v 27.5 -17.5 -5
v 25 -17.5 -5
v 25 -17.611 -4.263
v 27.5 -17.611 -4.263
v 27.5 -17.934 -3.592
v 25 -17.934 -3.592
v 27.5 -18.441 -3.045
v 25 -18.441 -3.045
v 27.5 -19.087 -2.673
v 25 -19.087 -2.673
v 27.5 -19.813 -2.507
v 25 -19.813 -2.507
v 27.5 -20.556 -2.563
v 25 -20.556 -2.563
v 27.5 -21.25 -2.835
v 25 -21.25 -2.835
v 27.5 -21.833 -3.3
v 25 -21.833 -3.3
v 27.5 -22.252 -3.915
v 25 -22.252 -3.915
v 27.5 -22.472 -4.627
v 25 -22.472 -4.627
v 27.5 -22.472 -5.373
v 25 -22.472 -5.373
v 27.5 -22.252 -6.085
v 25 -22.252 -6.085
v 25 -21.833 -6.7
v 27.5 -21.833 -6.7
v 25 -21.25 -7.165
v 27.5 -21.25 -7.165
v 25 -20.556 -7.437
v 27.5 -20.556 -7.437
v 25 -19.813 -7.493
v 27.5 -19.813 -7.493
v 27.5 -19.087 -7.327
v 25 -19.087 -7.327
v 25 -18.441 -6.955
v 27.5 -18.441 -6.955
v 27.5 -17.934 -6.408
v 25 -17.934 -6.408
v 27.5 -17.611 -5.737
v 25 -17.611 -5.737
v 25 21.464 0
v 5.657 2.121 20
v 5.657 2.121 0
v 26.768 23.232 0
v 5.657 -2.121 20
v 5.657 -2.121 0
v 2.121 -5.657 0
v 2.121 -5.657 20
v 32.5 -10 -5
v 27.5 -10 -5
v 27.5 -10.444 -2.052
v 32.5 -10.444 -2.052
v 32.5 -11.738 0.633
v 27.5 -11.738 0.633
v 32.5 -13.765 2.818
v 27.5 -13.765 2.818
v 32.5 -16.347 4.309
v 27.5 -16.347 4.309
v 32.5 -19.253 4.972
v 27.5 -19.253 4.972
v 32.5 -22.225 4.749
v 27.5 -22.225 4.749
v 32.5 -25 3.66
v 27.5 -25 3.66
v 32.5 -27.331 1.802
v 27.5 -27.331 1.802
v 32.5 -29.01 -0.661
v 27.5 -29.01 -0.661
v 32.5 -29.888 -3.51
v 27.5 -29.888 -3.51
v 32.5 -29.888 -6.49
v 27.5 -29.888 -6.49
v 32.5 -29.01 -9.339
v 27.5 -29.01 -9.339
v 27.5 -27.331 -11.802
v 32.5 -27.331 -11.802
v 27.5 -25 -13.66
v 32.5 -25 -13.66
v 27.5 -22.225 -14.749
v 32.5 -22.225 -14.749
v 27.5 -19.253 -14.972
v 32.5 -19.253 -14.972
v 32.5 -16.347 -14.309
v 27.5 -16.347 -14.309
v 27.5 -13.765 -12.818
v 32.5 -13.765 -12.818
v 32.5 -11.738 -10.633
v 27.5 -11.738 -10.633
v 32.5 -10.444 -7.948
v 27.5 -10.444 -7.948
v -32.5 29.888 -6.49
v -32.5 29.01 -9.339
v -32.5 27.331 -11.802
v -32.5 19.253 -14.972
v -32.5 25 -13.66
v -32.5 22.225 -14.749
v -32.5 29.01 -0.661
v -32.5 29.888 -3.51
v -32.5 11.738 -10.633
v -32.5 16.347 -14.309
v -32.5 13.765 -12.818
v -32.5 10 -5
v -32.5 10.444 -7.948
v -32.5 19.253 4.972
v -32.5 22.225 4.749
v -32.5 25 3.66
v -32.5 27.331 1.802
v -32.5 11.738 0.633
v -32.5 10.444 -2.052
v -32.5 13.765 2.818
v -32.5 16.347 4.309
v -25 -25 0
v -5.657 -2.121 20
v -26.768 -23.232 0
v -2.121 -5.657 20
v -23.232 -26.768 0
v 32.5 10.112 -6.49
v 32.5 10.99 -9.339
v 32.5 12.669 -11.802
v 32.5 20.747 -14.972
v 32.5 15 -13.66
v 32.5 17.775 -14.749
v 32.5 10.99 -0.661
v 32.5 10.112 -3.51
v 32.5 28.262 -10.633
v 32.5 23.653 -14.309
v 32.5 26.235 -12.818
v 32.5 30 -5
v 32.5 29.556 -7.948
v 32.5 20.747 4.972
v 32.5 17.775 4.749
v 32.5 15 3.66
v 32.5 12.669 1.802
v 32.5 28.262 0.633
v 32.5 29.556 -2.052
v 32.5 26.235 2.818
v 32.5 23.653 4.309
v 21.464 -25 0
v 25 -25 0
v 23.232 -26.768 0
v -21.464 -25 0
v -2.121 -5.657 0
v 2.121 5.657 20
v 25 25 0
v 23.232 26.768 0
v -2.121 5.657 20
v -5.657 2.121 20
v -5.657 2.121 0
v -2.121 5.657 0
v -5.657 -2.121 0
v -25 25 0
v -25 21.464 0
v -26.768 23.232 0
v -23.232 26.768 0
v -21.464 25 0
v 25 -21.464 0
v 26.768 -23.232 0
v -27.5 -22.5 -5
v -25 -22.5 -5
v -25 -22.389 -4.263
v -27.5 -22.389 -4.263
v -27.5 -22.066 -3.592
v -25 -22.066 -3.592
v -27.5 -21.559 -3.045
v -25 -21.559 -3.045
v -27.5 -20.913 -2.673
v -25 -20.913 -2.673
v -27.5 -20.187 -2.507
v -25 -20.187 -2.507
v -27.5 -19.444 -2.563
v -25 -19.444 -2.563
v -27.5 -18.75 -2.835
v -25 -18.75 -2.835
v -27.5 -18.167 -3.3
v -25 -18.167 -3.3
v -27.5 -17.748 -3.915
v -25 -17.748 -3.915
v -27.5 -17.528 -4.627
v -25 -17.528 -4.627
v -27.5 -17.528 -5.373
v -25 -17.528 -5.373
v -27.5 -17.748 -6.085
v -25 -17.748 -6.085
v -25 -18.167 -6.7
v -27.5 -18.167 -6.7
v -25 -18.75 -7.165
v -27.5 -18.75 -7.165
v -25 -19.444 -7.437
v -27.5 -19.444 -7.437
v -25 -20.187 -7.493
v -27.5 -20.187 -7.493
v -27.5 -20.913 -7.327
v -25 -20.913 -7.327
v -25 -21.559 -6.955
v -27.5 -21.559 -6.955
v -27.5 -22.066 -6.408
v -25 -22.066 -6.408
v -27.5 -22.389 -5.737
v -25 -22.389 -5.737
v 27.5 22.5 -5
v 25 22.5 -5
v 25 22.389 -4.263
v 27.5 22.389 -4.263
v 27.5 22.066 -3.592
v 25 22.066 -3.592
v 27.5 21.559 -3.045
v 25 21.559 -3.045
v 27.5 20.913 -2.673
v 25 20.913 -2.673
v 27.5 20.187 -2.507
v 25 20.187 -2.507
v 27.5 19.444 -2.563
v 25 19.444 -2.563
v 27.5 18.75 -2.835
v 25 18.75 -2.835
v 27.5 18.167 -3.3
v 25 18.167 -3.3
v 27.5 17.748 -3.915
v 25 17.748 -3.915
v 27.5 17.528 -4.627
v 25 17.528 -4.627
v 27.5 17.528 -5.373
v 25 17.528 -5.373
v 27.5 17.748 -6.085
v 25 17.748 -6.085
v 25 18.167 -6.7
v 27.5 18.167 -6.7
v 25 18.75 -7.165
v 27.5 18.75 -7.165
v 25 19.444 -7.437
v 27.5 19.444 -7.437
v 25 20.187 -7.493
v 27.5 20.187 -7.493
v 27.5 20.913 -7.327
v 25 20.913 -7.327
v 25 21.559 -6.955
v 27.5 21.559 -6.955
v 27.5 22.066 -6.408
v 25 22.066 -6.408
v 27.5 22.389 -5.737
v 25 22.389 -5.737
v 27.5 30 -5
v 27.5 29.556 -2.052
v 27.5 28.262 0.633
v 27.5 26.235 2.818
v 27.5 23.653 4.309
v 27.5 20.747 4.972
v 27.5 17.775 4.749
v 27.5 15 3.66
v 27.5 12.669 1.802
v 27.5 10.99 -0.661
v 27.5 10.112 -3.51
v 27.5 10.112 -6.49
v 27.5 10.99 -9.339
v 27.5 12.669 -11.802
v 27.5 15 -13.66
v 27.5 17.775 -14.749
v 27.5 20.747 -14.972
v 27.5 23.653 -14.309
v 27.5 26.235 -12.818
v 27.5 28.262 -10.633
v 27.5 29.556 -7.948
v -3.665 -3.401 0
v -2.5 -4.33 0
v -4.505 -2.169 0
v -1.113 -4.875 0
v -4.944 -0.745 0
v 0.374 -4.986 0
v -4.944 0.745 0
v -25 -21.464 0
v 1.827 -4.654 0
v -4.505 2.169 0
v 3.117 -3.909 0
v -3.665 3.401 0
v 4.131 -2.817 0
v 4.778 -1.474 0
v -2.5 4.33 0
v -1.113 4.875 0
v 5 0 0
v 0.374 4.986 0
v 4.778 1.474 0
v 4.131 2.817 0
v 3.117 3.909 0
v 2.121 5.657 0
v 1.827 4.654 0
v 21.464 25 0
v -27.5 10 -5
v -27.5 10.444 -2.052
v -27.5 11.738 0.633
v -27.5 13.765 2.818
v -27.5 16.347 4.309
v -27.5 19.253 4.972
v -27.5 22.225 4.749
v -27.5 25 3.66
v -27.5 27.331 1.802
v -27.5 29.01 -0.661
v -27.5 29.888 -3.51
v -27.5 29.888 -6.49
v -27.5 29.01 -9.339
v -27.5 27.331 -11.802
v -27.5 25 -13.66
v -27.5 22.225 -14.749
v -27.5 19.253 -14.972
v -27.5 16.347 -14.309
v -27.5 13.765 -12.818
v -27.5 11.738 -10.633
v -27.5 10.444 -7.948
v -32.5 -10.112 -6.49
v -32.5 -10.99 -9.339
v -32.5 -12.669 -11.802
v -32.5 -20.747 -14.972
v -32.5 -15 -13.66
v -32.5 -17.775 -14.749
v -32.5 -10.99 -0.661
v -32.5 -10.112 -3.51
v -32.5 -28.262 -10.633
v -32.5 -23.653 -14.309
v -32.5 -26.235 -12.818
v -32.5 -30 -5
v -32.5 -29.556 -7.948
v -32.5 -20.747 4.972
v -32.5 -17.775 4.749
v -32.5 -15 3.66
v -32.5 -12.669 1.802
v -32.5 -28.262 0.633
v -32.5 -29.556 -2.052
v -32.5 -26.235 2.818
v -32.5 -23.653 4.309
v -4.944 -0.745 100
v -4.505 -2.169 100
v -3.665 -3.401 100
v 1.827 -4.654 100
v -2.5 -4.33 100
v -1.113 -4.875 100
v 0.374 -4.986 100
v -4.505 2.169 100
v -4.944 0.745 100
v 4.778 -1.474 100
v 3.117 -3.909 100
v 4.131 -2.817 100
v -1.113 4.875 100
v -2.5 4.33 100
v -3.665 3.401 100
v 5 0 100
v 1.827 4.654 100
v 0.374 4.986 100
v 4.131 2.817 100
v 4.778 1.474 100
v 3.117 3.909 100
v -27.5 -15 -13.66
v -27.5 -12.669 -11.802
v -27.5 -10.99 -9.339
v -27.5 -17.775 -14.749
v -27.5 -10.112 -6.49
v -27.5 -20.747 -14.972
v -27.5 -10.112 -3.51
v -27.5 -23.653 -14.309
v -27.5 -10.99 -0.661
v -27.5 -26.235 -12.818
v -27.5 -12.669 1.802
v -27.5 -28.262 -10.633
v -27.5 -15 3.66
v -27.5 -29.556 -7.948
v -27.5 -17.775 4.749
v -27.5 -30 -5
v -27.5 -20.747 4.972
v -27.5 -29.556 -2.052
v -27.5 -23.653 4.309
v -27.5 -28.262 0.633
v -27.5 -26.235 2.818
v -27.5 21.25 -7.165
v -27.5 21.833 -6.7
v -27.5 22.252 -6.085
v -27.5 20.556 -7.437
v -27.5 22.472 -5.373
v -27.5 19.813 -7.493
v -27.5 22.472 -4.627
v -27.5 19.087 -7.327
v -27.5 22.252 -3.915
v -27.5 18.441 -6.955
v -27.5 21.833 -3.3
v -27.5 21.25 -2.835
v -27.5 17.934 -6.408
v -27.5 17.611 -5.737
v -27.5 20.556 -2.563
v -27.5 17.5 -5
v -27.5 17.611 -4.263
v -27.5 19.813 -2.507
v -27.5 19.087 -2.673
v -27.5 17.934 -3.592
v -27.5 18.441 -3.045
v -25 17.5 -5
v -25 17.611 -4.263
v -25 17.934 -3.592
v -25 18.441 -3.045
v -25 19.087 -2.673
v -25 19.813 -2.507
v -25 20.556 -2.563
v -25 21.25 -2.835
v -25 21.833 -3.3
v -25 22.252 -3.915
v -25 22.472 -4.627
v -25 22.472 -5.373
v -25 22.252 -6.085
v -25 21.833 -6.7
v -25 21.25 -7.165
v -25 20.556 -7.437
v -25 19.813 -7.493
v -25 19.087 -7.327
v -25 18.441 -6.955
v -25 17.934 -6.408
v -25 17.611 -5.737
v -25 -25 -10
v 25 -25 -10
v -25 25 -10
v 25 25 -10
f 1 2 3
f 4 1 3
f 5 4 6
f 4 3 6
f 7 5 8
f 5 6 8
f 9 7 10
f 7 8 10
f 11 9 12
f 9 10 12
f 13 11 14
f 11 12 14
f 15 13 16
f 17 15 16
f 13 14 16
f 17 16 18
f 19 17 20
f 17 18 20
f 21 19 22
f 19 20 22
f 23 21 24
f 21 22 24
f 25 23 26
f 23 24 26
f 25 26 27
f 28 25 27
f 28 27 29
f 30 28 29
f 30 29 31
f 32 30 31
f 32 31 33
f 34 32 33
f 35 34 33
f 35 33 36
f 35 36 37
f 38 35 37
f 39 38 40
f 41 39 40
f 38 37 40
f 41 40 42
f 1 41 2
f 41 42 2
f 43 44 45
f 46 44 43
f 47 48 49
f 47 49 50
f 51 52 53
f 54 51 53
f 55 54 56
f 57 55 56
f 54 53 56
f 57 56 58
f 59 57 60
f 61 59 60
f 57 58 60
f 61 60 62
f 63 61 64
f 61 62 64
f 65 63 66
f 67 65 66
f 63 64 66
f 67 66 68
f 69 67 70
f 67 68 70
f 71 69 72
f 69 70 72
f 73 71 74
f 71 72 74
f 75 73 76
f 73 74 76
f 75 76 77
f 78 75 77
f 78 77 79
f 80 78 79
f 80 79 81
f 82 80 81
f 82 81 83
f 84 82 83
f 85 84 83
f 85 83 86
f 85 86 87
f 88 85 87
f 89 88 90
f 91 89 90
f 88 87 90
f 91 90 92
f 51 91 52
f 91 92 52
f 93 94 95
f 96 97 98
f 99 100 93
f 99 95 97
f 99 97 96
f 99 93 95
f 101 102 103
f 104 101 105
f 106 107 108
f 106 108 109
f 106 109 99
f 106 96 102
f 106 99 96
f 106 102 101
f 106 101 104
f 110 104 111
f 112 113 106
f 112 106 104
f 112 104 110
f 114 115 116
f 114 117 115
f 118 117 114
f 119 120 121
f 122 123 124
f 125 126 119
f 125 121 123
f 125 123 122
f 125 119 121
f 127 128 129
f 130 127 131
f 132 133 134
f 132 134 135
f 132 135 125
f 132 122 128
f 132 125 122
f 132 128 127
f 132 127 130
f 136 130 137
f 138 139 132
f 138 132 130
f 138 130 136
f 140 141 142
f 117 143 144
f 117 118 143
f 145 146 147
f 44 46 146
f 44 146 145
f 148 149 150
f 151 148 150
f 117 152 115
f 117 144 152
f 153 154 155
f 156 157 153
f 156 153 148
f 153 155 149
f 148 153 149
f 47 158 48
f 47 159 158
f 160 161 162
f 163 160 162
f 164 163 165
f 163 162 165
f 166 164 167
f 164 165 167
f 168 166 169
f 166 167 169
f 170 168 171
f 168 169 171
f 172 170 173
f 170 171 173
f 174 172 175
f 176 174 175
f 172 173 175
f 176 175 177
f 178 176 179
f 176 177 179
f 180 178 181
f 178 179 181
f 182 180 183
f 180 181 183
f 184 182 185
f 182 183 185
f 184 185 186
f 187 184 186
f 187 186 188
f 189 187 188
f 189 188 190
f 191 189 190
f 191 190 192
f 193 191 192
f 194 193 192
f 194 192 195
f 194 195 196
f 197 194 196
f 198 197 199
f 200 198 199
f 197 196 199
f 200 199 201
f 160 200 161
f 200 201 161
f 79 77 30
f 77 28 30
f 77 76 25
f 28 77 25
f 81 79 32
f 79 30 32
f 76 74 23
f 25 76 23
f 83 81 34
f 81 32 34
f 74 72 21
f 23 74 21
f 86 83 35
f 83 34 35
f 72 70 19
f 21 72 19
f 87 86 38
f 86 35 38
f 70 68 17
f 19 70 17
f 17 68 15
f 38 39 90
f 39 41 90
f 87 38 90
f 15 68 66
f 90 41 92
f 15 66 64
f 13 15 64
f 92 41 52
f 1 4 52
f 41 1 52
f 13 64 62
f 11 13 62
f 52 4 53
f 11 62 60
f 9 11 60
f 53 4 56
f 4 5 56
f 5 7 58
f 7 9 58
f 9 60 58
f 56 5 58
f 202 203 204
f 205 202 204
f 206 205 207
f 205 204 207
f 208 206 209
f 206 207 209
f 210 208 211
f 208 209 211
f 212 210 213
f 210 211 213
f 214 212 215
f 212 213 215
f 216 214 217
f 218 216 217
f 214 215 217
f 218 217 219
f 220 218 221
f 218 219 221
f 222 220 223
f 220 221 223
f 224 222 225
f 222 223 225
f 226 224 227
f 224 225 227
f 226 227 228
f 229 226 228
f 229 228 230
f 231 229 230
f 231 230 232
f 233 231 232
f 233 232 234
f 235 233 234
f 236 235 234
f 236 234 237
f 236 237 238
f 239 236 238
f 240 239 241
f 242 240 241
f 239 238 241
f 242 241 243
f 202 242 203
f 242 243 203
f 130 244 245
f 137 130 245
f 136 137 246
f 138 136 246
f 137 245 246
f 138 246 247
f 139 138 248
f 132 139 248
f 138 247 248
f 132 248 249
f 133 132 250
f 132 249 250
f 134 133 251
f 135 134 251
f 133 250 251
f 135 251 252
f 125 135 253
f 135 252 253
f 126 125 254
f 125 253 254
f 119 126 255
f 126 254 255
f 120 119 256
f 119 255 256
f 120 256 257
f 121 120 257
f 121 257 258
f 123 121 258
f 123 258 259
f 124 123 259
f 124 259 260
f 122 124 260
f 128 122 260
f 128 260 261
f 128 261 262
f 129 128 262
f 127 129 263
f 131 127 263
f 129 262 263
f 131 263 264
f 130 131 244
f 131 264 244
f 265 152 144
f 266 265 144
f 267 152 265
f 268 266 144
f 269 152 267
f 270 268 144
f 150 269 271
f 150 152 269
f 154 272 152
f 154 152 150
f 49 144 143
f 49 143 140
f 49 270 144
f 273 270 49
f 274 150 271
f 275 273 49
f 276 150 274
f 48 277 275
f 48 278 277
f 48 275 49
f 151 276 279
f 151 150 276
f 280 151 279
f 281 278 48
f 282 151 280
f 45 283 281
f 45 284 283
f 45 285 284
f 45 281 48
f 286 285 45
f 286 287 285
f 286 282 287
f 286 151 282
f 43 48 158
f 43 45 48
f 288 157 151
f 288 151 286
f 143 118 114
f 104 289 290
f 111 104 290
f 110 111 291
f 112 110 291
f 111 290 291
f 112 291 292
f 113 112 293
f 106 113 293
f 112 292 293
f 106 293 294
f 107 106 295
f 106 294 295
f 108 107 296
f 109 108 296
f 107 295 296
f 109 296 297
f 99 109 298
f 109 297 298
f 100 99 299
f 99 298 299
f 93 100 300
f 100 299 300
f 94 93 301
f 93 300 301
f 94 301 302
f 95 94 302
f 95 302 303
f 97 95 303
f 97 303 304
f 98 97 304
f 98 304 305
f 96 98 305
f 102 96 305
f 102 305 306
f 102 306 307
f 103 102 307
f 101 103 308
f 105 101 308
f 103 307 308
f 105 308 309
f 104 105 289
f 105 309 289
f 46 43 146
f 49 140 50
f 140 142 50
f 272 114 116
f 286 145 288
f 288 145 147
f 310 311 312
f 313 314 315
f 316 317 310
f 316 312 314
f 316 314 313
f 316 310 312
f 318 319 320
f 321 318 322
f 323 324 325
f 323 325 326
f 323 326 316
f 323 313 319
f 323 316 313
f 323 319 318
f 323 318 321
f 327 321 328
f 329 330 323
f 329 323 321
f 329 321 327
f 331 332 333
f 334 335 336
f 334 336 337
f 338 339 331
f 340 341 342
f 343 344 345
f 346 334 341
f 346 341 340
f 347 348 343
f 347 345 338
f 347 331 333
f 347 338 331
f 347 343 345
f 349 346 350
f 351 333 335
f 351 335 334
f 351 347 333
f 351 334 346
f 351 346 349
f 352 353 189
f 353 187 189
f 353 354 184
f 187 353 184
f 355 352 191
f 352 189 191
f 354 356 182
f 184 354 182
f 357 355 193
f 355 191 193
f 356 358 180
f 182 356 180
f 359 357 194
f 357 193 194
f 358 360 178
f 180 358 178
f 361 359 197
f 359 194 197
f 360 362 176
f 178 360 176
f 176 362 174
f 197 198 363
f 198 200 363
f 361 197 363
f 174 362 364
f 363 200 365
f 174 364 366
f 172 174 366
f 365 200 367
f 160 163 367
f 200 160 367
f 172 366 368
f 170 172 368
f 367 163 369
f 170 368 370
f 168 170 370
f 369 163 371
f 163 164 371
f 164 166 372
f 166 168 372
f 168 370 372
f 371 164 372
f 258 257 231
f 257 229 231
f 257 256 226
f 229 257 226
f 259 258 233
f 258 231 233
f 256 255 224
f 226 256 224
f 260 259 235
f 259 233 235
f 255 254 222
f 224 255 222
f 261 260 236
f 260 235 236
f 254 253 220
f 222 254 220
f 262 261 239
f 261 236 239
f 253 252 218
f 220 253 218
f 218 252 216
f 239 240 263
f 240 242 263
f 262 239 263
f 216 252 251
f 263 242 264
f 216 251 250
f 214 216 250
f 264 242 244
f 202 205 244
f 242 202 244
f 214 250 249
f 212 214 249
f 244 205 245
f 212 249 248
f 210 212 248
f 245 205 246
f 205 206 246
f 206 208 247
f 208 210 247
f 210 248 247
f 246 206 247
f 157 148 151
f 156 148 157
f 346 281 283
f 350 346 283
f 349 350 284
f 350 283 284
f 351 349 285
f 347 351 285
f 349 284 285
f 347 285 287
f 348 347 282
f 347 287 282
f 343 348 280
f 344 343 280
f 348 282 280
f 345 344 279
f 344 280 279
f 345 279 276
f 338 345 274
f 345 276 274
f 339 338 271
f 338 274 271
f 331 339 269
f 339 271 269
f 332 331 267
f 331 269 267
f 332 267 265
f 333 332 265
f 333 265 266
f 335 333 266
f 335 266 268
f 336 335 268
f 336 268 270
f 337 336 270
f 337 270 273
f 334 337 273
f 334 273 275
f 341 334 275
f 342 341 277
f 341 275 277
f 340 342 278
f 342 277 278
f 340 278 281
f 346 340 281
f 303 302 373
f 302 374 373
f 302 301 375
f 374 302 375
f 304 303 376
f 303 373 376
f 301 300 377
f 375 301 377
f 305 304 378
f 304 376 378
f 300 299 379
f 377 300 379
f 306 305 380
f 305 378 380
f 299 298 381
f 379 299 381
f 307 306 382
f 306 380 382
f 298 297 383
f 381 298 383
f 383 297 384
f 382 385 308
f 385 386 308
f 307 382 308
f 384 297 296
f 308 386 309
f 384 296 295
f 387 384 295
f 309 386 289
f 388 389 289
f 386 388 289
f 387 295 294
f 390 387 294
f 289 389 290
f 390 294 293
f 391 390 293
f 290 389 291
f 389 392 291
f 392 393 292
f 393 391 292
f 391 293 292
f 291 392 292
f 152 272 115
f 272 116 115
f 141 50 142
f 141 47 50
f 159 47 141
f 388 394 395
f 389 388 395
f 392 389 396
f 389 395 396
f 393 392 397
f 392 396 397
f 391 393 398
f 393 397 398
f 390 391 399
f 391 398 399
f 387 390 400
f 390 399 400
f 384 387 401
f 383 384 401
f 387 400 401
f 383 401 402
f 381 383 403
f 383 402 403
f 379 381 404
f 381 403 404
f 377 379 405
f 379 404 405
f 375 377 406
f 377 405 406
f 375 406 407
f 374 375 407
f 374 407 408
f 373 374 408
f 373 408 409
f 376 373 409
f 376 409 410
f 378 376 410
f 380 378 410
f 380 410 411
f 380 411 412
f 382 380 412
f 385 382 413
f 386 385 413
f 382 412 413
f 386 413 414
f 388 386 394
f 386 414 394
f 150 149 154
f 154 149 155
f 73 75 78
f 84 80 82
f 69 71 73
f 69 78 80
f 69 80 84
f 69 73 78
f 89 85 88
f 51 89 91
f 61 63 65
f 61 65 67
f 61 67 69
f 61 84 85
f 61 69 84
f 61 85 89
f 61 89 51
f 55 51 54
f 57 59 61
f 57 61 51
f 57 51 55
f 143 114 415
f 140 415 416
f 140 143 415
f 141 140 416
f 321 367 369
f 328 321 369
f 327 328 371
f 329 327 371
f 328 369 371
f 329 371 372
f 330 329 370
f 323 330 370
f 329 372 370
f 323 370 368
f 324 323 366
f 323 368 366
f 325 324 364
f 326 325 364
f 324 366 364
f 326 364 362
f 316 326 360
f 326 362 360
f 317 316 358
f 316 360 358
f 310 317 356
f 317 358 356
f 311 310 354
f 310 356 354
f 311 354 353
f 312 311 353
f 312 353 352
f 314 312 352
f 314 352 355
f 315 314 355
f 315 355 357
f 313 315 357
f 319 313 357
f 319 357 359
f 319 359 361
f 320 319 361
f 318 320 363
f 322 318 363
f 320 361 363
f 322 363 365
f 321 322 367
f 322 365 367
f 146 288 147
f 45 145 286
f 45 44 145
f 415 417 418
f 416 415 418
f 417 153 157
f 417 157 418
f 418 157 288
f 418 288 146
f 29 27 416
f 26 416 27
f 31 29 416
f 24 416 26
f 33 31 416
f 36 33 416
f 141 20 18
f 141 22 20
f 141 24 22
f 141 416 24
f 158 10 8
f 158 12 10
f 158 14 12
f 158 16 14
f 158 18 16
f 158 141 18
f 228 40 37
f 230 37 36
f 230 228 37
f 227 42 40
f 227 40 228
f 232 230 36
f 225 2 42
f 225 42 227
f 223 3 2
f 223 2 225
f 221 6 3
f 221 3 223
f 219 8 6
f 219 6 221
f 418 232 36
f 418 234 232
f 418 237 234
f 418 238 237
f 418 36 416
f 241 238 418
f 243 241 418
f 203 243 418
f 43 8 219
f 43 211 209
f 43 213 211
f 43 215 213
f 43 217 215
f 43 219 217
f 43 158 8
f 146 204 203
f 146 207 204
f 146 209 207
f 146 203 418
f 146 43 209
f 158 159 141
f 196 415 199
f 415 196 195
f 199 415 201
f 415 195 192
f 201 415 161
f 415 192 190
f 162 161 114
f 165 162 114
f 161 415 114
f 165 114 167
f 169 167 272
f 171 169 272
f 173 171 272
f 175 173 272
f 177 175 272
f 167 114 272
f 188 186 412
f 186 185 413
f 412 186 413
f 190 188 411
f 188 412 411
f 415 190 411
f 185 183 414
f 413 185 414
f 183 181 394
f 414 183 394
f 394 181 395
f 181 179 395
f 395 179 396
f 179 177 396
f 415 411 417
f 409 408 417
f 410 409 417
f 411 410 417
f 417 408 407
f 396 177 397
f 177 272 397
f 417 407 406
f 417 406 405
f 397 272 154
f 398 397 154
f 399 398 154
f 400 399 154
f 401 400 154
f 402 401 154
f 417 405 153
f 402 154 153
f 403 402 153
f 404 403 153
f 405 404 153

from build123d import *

# Parameters (mm, degrees)
F0_R      = 5
F1_DEPTH  = 100
F2_W      = 50
F2_H      = 50
F3_DEPTH  = 10
F4_R      = 2.5
F5_DEPTH  = 2.5
F6_R      = 10
F7_DEPTH  = 5
F8_R      = 10
F9_DEPTH  = 5
F10_R     = 2.5
F11_DEPTH = 2.5
F12_R     = 10
F13_DEPTH = 5
F14_R     = 10
F15_DEPTH = 5
F20_DEPTH = 2.5
F24_DEPTH = 2.5
F26_DEPTH = 2.5


with BuildPart() as f1:
    # F0 (on Top) → F1 (new body)
    with BuildSketch(Plane.XY):
        Circle(F0_R)
    extrude(amount=F1_DEPTH)

    # F2 (on Top) → F3 (join)
    with BuildSketch(Plane.XY):
        Rectangle(F2_W, F2_H)
    extrude(amount=-F3_DEPTH)

    # F4 (on face) → F5 (join)
    with BuildSketch(Plane.YZ.offset(25)):
        with Locations((-20, -5)):
            Circle(F4_R)
        with Locations((20, -5)):
            Circle(F4_R)
    extrude(amount=F5_DEPTH)

    # F6 (on face) → F7 (join)
    with BuildSketch(Plane.YZ.offset(27.5)):
        with Locations((-20, -5)):
            Circle(F6_R)
    extrude(amount=F7_DEPTH)

    # F8 (on face) → F9 (join)
    with BuildSketch(Plane.YZ.offset(27.5)):
        with Locations((20, -5)):
            Circle(F8_R)
    extrude(amount=F9_DEPTH)

    # F10 (on face) → F11 (join)
    with BuildSketch(Plane(origin=(-25, 0, 0), x_dir=(0, -1, 0), z_dir=(-1, 0, 0))):
        with Locations((-20, -5)):
            Circle(F10_R)
        with Locations((20, -5)):
            Circle(F10_R)
    extrude(amount=F11_DEPTH)

    # F12 (on face) → F13 (join)
    with BuildSketch(Plane(origin=(-27.5, 0, 0), x_dir=(0, -1, 0), z_dir=(-1, 0, 0))):
        with Locations((-20, -5)):
            Circle(F12_R)
    extrude(amount=F13_DEPTH)

    # F14 (on face) → F15 (join)
    with BuildSketch(Plane(origin=(-27.5, 0, 0), x_dir=(0, -1, 0), z_dir=(-1, 0, 0))):
        with Locations((20, -5)):
            Circle(F14_R)
    extrude(amount=F15_DEPTH)

    # F19 (on 3pt) → F20 (join, symmetric)
    with BuildSketch(Plane(origin=(0, 0, 0), x_dir=(0.7071067812, 0.7071067812, 0), z_dir=(0.7071067812, -0.7071067812, 0))):
        Polygon((-5.5, 20), (-35.3553390593, 0), (-5.5, 0), align=None)
    extrude(amount=F20_DEPTH, both=True)

    # F23 (on 3pt) → F24 (join, symmetric)
    with BuildSketch(Plane(origin=(0, 0, 0), x_dir=(-0.7071067812, 0.7071067812, 0), z_dir=(0.7071067812, 0.7071067812, 0))):
        Polygon((5.5, 20), (5.5, 0), (35.3553390593, 0), align=None)
        Polygon((-35.3553390593, 0), (-5.5, 0), (-5.5, 20), align=None)
    extrude(amount=F24_DEPTH, both=True)

    # F25 (on 3pt) → F26 (join, symmetric)
    with BuildSketch(Plane(origin=(0, 0, 0), x_dir=(0.7071067812, 0.7071067812, 0), z_dir=(0.7071067812, -0.7071067812, 0))):
        Polygon((5.5, 20), (5.5, 0), (35.3553390593, 0), align=None)
    extrude(amount=F26_DEPTH, both=True)


solid = f1.part
